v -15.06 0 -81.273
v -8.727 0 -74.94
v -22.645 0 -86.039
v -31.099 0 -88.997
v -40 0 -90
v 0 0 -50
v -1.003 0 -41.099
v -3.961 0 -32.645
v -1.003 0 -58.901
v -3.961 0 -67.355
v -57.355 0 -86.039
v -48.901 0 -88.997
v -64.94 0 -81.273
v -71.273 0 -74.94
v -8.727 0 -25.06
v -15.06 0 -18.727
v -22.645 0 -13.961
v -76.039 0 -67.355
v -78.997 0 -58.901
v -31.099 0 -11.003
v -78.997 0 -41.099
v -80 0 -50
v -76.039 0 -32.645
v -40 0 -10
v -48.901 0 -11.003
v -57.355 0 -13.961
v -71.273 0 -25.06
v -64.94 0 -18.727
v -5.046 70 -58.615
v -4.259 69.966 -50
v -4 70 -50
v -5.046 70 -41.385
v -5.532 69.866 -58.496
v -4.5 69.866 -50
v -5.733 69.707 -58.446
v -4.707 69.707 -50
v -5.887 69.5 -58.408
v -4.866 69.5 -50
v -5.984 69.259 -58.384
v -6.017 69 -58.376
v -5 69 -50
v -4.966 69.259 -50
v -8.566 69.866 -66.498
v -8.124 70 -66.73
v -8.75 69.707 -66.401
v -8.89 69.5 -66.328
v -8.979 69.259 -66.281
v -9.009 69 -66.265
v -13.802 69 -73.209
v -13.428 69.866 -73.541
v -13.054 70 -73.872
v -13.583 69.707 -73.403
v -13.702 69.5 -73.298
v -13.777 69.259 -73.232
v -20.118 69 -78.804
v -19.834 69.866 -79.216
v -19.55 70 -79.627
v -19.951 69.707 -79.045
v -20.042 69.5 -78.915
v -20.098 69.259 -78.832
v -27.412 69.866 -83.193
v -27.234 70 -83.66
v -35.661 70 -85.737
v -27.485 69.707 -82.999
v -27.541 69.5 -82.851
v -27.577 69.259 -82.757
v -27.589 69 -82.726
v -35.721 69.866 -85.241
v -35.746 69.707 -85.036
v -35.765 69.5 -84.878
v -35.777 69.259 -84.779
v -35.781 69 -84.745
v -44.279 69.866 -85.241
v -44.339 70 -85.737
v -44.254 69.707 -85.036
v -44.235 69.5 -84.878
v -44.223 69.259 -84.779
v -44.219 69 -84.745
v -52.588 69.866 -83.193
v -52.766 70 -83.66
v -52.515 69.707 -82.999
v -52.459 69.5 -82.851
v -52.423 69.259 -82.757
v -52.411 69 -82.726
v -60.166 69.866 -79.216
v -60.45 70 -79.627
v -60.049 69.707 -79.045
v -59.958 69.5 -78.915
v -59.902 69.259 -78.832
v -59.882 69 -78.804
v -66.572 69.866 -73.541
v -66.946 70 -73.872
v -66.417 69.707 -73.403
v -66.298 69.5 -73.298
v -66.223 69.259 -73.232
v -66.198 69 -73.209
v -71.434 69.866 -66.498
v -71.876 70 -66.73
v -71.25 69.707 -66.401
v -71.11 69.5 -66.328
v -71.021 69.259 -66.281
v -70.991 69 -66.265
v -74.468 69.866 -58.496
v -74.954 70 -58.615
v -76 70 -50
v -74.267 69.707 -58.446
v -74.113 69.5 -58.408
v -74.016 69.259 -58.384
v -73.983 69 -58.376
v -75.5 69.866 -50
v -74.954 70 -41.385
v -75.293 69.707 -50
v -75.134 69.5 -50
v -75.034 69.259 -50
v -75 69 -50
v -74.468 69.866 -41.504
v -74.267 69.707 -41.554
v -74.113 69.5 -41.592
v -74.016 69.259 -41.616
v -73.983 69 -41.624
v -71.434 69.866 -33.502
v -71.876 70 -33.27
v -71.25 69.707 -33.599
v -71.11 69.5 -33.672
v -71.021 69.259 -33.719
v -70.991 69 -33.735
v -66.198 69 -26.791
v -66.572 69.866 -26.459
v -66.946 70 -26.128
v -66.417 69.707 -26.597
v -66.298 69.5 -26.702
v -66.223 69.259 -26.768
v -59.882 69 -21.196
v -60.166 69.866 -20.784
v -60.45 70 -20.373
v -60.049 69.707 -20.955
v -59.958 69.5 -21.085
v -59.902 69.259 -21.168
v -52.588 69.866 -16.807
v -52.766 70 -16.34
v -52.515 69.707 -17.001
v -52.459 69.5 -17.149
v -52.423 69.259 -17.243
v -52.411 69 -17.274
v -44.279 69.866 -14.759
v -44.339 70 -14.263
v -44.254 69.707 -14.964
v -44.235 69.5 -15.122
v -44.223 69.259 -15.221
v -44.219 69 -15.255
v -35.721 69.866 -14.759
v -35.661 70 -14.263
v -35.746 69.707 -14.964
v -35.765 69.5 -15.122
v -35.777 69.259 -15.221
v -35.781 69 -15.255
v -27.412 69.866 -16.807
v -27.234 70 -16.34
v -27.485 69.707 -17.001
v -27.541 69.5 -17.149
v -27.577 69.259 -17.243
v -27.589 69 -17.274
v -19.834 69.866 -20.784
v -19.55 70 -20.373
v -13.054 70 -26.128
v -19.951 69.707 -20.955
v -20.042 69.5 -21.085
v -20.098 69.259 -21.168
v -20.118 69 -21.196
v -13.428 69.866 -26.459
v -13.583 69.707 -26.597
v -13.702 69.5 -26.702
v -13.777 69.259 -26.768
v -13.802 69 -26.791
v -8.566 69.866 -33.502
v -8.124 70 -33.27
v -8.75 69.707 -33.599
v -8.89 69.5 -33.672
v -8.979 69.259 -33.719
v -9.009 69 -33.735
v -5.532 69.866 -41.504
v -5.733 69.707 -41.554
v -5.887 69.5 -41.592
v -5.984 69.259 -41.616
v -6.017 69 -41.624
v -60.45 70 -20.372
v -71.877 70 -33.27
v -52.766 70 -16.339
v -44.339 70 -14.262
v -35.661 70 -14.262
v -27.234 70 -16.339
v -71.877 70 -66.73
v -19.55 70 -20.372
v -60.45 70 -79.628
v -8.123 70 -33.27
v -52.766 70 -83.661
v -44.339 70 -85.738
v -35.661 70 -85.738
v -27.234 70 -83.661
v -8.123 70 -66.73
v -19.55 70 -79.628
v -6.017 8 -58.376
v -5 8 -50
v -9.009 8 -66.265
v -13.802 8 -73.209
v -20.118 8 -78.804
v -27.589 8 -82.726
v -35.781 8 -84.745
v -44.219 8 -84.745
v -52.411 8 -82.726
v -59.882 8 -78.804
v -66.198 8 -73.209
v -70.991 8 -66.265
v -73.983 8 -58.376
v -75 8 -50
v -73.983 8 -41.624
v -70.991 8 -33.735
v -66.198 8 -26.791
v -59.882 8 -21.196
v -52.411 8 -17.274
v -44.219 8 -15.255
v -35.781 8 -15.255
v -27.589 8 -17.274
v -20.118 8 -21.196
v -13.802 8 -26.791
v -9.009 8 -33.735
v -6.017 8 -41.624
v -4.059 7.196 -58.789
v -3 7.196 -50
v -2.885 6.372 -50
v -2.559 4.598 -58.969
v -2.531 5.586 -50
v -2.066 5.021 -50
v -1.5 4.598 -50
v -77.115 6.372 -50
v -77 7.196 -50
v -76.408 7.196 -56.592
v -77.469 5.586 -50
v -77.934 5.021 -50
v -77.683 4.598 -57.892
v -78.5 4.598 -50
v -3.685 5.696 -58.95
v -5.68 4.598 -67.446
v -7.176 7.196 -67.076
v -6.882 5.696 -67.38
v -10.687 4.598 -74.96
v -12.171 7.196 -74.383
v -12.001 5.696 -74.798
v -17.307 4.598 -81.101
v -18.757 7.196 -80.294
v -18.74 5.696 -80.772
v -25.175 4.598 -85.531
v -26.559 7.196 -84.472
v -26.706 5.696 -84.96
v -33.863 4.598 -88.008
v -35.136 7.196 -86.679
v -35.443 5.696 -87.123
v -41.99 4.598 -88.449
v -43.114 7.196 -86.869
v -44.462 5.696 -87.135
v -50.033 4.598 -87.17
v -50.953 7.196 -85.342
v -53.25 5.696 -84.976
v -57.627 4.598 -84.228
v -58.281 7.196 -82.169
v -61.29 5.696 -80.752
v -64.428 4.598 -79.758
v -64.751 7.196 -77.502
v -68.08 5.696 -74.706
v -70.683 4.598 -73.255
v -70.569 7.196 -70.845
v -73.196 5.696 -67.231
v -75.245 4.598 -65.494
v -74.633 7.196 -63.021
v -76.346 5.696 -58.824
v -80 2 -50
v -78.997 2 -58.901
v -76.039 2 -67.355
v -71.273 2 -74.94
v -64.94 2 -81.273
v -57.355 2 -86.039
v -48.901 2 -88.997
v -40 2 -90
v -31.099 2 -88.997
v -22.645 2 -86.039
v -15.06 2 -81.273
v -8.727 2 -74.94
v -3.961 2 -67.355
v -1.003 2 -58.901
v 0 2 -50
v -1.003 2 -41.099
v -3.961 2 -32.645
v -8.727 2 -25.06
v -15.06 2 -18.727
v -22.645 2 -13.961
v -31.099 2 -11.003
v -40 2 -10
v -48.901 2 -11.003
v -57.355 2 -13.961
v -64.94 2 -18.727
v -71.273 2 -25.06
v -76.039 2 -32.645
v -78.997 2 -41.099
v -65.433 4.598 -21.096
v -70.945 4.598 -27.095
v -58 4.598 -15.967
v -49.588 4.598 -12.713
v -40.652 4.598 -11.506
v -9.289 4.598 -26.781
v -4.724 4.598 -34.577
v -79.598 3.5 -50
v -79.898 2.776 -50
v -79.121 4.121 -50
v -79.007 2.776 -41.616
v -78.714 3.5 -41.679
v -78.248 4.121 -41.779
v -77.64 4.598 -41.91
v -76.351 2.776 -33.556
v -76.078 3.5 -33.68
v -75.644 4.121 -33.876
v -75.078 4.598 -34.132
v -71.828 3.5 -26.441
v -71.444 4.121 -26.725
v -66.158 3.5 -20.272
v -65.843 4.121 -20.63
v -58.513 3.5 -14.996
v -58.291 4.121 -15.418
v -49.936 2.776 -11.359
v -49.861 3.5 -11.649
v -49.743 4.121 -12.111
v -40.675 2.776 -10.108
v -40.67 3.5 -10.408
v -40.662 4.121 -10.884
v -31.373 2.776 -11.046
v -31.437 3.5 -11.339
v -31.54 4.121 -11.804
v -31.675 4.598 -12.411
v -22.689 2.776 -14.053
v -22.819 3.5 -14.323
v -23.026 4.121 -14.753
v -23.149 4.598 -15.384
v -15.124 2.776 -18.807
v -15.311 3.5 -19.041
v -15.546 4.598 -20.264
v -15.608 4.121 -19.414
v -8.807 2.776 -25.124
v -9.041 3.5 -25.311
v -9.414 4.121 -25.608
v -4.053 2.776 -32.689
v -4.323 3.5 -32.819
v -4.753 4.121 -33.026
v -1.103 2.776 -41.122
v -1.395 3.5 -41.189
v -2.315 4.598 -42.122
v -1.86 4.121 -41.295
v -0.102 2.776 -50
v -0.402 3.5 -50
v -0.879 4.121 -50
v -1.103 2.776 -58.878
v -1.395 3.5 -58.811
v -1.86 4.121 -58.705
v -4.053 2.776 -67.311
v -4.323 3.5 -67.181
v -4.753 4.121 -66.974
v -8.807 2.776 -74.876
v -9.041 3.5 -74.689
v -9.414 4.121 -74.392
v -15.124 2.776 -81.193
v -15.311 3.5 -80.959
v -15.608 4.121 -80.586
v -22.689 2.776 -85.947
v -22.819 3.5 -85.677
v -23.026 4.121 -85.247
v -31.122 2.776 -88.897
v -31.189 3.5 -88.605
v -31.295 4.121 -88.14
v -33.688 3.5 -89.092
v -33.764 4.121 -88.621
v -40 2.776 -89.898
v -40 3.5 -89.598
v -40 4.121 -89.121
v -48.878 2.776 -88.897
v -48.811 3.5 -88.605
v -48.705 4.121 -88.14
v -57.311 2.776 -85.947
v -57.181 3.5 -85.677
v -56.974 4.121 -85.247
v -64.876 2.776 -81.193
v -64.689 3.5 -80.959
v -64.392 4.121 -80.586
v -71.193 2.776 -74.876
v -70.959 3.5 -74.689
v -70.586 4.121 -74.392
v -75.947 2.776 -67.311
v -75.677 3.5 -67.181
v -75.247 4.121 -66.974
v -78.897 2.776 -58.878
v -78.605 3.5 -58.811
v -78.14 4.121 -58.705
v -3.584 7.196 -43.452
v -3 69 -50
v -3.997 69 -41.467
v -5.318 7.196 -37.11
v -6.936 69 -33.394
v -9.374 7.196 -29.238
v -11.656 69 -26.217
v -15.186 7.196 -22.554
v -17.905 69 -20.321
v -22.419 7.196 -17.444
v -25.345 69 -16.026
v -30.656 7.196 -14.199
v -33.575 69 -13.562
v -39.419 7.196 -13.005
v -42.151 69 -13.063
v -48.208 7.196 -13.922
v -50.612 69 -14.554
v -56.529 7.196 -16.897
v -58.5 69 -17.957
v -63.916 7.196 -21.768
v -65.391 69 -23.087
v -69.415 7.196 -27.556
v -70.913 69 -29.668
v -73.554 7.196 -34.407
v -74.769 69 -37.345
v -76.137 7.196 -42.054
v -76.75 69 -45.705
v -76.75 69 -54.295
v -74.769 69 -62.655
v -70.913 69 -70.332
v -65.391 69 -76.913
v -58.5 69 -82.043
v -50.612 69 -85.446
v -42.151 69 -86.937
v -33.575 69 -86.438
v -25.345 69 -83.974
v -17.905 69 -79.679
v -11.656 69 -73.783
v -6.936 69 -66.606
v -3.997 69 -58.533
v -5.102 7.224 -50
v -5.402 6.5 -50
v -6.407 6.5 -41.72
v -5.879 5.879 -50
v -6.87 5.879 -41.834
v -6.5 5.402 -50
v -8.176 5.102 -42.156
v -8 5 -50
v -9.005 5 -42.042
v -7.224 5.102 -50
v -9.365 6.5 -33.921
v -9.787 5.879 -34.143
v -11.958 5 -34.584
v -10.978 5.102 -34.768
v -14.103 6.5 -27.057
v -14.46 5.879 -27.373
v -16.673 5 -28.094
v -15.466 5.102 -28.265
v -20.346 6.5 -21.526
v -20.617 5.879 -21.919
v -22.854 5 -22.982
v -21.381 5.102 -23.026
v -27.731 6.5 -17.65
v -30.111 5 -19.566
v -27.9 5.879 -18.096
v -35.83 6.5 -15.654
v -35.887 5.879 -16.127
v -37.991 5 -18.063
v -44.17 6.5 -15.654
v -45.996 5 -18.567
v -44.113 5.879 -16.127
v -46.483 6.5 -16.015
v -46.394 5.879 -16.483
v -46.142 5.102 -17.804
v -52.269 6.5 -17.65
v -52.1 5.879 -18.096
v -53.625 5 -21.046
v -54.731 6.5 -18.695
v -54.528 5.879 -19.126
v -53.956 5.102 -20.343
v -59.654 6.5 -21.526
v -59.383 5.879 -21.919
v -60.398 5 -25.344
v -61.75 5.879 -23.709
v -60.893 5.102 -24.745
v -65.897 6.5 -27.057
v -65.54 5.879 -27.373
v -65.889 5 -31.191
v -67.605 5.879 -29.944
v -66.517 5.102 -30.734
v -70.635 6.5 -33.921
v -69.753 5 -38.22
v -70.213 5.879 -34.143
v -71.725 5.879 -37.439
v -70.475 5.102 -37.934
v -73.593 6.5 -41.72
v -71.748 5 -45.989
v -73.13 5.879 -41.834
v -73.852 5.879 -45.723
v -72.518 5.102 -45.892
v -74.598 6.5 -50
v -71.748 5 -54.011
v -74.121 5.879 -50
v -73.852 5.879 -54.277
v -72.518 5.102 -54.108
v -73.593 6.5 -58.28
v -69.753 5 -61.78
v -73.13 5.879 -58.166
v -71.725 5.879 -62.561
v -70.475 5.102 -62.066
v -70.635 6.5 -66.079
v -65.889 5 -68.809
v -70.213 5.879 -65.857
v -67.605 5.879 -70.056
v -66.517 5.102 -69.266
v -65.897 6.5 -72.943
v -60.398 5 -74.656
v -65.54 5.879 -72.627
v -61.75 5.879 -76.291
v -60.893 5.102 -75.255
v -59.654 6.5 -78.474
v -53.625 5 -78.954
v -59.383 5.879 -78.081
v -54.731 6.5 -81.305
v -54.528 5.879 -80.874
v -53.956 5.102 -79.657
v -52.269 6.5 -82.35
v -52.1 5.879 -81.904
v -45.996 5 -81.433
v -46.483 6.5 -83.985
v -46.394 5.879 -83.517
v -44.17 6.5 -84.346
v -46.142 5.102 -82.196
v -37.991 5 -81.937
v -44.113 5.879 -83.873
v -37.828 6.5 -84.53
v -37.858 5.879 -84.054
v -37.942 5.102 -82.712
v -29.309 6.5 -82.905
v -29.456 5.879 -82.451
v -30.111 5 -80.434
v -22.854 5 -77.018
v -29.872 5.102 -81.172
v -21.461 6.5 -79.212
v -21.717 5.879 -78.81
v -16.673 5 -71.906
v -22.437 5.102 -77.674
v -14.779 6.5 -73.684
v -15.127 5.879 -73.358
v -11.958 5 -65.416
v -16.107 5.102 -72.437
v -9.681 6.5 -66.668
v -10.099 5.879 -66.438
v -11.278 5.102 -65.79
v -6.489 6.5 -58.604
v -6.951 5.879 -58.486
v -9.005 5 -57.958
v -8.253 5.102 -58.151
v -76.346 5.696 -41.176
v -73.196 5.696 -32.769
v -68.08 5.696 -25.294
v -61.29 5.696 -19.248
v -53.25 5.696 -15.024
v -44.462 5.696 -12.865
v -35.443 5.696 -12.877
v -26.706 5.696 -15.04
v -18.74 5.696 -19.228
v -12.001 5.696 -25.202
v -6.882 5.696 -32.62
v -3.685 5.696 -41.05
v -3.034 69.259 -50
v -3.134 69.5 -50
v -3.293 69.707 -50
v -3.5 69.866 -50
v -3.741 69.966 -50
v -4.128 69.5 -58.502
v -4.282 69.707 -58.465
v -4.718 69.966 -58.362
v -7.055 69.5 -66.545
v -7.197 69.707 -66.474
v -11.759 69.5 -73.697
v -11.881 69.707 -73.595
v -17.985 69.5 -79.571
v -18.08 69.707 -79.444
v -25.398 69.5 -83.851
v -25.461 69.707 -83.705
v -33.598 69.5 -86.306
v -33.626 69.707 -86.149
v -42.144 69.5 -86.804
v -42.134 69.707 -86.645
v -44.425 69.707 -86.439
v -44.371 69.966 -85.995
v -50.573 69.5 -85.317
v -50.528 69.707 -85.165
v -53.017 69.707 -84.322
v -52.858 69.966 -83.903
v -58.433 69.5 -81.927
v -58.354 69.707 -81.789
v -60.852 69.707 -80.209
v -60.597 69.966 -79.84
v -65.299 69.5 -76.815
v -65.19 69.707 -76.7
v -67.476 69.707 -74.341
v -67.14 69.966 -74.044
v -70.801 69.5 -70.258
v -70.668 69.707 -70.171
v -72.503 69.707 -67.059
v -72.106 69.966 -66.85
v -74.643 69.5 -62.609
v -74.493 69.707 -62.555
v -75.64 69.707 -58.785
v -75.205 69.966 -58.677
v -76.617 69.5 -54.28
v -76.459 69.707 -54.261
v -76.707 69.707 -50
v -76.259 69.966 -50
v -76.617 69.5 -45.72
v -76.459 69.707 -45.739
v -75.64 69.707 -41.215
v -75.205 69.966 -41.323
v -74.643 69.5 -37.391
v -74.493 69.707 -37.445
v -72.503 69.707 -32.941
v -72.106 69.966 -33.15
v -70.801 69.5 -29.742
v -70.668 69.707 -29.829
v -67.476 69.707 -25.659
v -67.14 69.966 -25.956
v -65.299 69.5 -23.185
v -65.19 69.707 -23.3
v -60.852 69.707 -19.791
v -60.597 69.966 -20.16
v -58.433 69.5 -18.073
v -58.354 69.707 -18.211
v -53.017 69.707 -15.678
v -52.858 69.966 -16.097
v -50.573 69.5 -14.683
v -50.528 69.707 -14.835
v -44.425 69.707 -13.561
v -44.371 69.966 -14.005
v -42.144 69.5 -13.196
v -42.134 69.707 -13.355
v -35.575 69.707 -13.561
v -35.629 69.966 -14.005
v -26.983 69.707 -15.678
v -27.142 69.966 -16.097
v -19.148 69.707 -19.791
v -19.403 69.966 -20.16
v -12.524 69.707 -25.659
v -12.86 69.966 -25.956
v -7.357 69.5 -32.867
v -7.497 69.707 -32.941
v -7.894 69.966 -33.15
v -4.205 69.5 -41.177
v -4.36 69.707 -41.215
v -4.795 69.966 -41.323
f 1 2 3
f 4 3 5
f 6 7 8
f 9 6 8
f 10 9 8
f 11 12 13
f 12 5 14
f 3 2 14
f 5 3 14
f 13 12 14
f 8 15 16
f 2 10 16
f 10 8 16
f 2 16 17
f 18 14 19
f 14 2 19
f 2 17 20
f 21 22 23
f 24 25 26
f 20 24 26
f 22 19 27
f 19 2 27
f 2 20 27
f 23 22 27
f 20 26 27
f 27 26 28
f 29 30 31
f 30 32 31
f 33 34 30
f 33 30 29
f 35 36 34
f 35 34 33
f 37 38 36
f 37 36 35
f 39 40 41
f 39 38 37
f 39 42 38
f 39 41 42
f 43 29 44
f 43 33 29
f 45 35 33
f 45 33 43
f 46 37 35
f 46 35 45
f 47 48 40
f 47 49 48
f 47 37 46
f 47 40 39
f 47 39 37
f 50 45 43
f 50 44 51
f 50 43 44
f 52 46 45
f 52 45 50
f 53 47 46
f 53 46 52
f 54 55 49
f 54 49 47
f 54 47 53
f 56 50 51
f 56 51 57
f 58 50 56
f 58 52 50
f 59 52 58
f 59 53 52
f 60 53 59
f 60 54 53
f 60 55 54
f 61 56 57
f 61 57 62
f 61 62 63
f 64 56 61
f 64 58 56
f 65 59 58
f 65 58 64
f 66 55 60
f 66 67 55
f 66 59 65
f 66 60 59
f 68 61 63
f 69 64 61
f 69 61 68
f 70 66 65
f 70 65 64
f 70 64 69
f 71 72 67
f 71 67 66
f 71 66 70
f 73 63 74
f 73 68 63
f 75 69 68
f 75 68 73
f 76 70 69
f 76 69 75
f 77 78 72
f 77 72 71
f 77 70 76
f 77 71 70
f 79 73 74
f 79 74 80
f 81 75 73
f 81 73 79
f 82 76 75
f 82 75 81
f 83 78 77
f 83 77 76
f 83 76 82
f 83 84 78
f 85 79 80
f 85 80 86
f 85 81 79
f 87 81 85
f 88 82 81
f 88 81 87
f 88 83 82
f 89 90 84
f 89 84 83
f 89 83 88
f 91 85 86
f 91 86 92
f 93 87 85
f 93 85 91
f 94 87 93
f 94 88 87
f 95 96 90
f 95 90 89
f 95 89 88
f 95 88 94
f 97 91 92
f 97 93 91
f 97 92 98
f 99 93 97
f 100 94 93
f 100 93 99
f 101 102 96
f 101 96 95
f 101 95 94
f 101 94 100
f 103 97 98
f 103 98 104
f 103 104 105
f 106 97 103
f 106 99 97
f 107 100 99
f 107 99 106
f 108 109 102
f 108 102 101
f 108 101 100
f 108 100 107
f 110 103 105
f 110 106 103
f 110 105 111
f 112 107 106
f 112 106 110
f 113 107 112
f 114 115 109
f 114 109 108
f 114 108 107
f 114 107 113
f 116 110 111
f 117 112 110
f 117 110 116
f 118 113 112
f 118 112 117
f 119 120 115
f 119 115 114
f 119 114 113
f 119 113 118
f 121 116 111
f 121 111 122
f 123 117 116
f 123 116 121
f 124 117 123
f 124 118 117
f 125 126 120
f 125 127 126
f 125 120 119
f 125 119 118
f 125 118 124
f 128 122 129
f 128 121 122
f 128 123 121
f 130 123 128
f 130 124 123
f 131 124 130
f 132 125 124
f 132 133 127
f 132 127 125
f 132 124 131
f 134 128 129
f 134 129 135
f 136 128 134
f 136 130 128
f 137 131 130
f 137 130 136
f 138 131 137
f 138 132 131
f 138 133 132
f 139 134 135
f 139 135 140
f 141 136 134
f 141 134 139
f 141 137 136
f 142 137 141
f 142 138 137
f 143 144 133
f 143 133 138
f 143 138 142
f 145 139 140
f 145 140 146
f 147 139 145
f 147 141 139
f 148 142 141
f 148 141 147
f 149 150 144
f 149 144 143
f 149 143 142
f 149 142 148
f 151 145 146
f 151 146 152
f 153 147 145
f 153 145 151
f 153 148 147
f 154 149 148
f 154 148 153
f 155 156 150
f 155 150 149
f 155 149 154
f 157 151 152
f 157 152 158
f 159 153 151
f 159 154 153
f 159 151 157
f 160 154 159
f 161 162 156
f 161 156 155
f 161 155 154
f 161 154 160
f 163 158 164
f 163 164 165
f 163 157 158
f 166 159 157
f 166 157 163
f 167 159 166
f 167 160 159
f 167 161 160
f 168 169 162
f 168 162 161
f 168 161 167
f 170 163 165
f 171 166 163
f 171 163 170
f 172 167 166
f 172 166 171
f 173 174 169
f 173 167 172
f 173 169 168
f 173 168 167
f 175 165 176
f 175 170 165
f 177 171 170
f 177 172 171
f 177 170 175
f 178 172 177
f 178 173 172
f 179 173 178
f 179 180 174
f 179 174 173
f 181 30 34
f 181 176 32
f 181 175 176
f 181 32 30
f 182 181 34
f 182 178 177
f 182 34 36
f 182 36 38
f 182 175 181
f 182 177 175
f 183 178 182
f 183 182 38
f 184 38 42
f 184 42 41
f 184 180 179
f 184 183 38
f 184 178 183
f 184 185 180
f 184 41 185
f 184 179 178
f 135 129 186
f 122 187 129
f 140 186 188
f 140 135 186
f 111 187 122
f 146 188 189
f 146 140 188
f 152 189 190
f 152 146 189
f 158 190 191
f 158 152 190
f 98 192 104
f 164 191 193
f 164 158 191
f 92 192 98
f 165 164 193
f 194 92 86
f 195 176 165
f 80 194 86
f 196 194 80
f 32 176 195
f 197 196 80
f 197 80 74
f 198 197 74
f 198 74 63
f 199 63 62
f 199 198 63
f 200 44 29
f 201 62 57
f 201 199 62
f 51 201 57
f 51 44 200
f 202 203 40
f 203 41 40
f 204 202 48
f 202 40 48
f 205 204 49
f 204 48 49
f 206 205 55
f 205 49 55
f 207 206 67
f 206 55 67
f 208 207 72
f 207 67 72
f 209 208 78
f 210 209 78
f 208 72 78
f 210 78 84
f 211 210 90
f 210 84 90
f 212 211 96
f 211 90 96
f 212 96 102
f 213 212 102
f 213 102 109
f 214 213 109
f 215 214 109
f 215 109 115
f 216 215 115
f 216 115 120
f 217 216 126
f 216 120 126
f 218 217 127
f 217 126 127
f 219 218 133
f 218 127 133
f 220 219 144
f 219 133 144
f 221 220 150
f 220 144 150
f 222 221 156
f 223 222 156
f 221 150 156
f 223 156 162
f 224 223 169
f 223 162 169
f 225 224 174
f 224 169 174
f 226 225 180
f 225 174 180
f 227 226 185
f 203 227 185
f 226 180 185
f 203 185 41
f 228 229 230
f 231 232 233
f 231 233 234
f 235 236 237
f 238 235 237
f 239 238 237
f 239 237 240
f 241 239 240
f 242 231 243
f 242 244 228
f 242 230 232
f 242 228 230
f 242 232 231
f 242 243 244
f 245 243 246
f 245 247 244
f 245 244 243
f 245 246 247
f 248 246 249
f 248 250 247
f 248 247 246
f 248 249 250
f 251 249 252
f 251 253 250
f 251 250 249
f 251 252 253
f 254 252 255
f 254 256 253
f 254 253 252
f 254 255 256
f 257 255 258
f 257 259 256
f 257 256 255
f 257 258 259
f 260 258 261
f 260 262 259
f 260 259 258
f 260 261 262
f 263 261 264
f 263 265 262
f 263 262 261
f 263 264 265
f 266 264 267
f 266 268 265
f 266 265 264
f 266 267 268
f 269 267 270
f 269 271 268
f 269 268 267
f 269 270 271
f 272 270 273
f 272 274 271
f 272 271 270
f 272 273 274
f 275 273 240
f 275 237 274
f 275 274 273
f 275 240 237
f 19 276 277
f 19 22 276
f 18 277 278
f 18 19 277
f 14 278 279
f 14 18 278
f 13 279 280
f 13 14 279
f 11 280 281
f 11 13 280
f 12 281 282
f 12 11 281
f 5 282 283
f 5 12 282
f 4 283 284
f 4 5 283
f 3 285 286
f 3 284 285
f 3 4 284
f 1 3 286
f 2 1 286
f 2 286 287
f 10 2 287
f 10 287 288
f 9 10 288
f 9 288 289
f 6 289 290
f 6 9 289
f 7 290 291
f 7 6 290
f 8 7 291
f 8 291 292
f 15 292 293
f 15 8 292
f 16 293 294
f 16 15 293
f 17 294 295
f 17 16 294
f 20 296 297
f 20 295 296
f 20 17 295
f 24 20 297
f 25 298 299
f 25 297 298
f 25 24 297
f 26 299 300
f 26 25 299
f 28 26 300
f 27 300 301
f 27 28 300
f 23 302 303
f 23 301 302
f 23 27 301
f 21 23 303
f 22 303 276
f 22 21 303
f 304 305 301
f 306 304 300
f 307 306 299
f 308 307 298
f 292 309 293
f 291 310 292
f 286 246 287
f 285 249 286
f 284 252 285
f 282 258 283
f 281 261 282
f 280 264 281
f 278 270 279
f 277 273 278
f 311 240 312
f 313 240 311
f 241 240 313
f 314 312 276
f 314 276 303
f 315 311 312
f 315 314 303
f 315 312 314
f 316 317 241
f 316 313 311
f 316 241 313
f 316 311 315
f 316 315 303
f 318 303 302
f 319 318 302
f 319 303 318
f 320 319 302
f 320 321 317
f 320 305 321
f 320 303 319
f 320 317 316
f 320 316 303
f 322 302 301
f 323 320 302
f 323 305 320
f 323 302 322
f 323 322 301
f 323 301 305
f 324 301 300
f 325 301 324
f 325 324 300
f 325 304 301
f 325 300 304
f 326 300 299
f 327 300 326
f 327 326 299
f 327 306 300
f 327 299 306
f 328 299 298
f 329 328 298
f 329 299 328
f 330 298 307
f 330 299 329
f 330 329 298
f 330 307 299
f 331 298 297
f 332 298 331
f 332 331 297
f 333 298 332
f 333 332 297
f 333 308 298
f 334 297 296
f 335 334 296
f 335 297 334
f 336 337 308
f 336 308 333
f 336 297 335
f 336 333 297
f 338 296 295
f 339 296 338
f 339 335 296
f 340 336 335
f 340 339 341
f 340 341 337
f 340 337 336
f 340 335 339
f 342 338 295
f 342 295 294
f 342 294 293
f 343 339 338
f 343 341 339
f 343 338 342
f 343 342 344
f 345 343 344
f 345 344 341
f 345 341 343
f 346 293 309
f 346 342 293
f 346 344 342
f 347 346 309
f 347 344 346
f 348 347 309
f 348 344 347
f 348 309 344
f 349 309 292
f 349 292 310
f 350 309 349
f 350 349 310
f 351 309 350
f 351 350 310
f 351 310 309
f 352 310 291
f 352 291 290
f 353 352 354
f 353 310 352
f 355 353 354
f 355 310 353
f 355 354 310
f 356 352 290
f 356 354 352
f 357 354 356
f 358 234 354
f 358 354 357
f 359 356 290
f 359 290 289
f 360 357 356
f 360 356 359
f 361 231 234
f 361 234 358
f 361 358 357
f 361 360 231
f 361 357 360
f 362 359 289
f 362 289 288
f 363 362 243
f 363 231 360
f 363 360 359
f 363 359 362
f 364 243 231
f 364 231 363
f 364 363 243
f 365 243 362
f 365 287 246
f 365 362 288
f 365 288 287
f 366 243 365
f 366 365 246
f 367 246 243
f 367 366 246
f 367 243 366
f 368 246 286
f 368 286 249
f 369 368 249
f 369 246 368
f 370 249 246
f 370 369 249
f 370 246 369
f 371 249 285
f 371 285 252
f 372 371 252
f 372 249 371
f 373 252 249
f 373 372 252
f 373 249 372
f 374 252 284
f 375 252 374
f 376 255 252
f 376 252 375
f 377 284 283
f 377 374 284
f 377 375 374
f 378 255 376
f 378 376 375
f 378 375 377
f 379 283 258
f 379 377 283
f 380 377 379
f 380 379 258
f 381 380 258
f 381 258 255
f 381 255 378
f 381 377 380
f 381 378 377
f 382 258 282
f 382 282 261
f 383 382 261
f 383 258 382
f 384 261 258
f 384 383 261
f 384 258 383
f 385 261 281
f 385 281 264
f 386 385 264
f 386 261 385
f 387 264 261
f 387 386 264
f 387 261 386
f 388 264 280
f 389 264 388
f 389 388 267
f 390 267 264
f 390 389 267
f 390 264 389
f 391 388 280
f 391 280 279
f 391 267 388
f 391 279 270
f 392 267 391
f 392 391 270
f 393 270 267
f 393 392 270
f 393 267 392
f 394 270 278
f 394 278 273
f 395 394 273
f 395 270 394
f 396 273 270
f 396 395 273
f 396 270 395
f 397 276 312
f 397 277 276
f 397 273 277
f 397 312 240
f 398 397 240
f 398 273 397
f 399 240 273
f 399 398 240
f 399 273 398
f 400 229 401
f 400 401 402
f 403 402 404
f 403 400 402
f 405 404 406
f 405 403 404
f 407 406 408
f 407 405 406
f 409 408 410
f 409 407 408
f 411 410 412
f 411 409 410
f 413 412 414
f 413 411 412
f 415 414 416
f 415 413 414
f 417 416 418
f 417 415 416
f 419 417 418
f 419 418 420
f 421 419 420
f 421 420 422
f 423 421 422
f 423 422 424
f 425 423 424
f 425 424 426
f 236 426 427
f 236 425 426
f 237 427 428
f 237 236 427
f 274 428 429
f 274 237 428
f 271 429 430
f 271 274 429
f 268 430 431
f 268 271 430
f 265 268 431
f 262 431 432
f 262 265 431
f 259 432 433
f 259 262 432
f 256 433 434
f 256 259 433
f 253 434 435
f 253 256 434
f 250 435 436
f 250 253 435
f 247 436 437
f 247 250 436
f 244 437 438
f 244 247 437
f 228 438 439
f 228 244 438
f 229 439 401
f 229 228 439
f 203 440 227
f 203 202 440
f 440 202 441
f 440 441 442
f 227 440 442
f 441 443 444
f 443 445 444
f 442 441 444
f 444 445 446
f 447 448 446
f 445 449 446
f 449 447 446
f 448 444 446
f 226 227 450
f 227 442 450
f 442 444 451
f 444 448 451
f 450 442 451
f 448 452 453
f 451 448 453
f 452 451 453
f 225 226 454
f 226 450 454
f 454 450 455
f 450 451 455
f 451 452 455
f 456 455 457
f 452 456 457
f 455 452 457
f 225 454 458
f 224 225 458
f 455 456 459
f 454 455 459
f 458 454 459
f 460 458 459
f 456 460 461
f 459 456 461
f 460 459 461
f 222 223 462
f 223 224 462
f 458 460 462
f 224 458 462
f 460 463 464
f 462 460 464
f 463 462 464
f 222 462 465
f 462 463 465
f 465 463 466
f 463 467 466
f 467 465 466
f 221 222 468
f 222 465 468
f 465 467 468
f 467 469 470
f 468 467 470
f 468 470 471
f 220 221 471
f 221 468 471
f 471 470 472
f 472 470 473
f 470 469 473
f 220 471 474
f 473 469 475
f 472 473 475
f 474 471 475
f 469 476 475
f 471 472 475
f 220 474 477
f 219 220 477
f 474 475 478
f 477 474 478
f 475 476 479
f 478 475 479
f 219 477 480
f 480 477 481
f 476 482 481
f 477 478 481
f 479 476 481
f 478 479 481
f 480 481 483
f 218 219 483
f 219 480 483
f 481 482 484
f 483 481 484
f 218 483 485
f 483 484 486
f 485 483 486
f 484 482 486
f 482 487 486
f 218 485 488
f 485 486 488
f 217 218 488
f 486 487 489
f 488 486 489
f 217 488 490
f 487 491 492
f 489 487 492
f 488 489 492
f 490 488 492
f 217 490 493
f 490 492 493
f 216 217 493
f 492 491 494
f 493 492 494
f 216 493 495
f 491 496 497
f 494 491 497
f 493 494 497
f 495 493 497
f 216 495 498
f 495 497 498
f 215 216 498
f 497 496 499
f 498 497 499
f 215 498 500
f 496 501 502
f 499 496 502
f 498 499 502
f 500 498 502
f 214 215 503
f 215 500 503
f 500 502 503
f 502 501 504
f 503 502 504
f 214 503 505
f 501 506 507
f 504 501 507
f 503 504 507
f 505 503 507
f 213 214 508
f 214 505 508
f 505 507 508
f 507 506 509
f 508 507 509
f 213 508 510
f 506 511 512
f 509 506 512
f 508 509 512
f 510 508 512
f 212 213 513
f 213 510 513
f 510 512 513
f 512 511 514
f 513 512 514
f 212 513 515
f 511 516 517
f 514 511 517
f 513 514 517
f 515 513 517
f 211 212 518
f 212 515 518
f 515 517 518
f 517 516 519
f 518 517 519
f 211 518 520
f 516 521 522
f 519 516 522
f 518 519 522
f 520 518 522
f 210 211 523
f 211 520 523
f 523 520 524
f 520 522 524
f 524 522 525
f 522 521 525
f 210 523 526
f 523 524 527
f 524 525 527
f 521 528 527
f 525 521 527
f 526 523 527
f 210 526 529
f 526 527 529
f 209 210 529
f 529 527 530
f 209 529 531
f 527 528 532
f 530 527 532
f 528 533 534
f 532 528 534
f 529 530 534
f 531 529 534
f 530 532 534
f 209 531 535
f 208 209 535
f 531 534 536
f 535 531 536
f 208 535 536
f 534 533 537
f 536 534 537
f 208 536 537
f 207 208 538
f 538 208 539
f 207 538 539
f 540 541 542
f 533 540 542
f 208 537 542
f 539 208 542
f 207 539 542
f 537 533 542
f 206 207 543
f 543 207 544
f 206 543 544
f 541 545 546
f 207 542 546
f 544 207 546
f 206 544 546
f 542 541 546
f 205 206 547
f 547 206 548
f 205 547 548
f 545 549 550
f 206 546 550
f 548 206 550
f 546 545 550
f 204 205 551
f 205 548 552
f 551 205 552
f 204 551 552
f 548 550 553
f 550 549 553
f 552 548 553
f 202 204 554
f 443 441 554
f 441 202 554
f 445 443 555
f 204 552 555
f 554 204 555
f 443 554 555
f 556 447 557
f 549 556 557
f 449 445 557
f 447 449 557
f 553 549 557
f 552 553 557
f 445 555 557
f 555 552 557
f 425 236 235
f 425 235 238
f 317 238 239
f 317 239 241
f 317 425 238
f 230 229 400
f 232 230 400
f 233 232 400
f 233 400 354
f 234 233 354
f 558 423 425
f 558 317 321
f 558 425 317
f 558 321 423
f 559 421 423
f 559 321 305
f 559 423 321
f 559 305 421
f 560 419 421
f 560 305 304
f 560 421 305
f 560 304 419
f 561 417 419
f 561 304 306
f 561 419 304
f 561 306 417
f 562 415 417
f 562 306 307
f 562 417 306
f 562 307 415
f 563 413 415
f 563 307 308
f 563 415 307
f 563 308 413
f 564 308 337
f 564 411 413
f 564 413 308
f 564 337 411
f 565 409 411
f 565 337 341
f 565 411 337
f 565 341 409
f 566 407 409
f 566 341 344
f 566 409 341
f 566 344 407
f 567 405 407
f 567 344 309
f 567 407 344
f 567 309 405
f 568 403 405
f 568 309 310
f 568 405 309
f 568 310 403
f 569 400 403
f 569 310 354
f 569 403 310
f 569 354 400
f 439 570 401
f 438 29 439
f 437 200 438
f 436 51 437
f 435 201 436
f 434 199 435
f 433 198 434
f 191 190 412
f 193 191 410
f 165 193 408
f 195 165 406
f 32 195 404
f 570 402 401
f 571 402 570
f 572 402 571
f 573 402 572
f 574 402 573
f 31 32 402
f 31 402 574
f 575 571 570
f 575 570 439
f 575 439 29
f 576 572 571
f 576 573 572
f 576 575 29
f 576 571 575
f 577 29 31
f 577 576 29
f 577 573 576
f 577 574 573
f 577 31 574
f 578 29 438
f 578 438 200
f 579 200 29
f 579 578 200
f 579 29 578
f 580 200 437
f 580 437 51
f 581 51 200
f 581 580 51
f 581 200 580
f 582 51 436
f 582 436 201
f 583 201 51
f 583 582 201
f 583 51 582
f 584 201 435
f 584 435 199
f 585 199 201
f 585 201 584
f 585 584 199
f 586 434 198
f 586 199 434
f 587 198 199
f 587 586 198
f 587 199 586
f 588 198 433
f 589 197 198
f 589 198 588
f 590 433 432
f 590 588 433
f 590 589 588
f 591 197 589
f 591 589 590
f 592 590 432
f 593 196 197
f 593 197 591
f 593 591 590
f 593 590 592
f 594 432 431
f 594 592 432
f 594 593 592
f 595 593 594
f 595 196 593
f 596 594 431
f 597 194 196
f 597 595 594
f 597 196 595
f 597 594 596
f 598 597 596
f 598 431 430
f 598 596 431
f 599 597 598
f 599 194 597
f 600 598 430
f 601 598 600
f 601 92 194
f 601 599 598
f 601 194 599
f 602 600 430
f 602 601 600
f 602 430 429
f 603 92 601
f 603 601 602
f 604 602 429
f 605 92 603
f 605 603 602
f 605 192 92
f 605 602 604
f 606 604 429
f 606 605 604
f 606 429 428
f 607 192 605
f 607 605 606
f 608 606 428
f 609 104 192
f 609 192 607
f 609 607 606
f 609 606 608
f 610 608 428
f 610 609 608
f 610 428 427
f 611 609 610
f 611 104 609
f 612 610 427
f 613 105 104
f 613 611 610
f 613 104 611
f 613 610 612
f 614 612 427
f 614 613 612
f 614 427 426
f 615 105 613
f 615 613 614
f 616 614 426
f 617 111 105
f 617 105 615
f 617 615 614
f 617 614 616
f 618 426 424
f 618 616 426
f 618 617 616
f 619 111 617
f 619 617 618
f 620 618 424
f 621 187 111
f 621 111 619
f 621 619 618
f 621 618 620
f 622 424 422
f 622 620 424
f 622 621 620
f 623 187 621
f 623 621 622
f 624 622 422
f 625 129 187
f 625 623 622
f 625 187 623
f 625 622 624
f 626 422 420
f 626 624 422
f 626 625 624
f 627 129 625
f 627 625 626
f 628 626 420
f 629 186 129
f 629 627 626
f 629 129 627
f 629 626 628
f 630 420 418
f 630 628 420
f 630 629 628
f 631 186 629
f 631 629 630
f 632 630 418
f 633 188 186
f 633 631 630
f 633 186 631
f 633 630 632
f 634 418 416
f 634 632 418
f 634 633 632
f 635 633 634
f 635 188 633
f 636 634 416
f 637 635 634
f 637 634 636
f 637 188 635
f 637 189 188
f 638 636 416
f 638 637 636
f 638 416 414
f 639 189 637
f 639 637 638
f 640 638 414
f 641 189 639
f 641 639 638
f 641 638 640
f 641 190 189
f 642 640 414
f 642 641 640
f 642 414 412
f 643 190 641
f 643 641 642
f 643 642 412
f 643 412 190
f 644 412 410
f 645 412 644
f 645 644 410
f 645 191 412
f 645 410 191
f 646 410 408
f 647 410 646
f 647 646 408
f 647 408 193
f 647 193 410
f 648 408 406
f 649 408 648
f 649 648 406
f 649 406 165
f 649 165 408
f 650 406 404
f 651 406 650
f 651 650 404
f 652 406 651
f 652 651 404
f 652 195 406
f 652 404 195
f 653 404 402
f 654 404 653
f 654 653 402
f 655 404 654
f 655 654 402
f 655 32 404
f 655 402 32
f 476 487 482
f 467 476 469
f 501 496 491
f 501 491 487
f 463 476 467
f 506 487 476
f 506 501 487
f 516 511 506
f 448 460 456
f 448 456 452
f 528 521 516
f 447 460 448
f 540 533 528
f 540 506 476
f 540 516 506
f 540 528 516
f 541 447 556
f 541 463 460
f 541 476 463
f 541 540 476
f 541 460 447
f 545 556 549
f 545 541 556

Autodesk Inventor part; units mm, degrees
ref_plane "YZ Plane" through (0, 0, 0) normal (1, 0, 0) x (0, 1, 0)
ref_plane "XZ Plane" through (0, 0, 0) normal (0, 1, 0) x (-1, 0, 0)
ref_plane "XY Plane" through (0, 0, 0) normal (0, 0, 1) x (1, 0, 0)
sketch "Schizzo1" plane through (0, 0, 0) normal (0, 1, 0) x (-1, 0, 0)
  circle A0 centre (40, -50) radius 40
  point P0 (0, 0)
extrude "Estrusione1" add sketch "Schizzo1" along normal blind 5
fillet "Raccordo1" radius 3 1 edges at (0, 5, -50)
sketch "Schizzo2" plane through (-40, 5, -50) normal (0, 1, 0) x (1, 0, 0)
  circle A0 centre (0, 0) radius 37
  point P0 (40, -50)
extrude "Estrusione2" add sketch "Schizzo2" along normal blind 65
fillet "Raccordo2" radius 3 2 edges at (-40, 5, -87) (-40, 5, -13)
sketch "Schizzo3" plane through (-40, 70, -50) normal (0, 1, 0) x (1, 0, 0)
  circle A0 centre (0, 0) radius 35
  point P0 (40, -50)
  dimension "d8" = 70
extrude "Estrusione3" cut sketch "Schizzo3" against normal blind 65
fillet "Raccordo3" radius 1 2 edges at (-75, 70, -50) (-77, 70, -50)
fillet "Raccordo4" radius 3 1 edges at (-75, 5, -50)
properties part number "BASE"
